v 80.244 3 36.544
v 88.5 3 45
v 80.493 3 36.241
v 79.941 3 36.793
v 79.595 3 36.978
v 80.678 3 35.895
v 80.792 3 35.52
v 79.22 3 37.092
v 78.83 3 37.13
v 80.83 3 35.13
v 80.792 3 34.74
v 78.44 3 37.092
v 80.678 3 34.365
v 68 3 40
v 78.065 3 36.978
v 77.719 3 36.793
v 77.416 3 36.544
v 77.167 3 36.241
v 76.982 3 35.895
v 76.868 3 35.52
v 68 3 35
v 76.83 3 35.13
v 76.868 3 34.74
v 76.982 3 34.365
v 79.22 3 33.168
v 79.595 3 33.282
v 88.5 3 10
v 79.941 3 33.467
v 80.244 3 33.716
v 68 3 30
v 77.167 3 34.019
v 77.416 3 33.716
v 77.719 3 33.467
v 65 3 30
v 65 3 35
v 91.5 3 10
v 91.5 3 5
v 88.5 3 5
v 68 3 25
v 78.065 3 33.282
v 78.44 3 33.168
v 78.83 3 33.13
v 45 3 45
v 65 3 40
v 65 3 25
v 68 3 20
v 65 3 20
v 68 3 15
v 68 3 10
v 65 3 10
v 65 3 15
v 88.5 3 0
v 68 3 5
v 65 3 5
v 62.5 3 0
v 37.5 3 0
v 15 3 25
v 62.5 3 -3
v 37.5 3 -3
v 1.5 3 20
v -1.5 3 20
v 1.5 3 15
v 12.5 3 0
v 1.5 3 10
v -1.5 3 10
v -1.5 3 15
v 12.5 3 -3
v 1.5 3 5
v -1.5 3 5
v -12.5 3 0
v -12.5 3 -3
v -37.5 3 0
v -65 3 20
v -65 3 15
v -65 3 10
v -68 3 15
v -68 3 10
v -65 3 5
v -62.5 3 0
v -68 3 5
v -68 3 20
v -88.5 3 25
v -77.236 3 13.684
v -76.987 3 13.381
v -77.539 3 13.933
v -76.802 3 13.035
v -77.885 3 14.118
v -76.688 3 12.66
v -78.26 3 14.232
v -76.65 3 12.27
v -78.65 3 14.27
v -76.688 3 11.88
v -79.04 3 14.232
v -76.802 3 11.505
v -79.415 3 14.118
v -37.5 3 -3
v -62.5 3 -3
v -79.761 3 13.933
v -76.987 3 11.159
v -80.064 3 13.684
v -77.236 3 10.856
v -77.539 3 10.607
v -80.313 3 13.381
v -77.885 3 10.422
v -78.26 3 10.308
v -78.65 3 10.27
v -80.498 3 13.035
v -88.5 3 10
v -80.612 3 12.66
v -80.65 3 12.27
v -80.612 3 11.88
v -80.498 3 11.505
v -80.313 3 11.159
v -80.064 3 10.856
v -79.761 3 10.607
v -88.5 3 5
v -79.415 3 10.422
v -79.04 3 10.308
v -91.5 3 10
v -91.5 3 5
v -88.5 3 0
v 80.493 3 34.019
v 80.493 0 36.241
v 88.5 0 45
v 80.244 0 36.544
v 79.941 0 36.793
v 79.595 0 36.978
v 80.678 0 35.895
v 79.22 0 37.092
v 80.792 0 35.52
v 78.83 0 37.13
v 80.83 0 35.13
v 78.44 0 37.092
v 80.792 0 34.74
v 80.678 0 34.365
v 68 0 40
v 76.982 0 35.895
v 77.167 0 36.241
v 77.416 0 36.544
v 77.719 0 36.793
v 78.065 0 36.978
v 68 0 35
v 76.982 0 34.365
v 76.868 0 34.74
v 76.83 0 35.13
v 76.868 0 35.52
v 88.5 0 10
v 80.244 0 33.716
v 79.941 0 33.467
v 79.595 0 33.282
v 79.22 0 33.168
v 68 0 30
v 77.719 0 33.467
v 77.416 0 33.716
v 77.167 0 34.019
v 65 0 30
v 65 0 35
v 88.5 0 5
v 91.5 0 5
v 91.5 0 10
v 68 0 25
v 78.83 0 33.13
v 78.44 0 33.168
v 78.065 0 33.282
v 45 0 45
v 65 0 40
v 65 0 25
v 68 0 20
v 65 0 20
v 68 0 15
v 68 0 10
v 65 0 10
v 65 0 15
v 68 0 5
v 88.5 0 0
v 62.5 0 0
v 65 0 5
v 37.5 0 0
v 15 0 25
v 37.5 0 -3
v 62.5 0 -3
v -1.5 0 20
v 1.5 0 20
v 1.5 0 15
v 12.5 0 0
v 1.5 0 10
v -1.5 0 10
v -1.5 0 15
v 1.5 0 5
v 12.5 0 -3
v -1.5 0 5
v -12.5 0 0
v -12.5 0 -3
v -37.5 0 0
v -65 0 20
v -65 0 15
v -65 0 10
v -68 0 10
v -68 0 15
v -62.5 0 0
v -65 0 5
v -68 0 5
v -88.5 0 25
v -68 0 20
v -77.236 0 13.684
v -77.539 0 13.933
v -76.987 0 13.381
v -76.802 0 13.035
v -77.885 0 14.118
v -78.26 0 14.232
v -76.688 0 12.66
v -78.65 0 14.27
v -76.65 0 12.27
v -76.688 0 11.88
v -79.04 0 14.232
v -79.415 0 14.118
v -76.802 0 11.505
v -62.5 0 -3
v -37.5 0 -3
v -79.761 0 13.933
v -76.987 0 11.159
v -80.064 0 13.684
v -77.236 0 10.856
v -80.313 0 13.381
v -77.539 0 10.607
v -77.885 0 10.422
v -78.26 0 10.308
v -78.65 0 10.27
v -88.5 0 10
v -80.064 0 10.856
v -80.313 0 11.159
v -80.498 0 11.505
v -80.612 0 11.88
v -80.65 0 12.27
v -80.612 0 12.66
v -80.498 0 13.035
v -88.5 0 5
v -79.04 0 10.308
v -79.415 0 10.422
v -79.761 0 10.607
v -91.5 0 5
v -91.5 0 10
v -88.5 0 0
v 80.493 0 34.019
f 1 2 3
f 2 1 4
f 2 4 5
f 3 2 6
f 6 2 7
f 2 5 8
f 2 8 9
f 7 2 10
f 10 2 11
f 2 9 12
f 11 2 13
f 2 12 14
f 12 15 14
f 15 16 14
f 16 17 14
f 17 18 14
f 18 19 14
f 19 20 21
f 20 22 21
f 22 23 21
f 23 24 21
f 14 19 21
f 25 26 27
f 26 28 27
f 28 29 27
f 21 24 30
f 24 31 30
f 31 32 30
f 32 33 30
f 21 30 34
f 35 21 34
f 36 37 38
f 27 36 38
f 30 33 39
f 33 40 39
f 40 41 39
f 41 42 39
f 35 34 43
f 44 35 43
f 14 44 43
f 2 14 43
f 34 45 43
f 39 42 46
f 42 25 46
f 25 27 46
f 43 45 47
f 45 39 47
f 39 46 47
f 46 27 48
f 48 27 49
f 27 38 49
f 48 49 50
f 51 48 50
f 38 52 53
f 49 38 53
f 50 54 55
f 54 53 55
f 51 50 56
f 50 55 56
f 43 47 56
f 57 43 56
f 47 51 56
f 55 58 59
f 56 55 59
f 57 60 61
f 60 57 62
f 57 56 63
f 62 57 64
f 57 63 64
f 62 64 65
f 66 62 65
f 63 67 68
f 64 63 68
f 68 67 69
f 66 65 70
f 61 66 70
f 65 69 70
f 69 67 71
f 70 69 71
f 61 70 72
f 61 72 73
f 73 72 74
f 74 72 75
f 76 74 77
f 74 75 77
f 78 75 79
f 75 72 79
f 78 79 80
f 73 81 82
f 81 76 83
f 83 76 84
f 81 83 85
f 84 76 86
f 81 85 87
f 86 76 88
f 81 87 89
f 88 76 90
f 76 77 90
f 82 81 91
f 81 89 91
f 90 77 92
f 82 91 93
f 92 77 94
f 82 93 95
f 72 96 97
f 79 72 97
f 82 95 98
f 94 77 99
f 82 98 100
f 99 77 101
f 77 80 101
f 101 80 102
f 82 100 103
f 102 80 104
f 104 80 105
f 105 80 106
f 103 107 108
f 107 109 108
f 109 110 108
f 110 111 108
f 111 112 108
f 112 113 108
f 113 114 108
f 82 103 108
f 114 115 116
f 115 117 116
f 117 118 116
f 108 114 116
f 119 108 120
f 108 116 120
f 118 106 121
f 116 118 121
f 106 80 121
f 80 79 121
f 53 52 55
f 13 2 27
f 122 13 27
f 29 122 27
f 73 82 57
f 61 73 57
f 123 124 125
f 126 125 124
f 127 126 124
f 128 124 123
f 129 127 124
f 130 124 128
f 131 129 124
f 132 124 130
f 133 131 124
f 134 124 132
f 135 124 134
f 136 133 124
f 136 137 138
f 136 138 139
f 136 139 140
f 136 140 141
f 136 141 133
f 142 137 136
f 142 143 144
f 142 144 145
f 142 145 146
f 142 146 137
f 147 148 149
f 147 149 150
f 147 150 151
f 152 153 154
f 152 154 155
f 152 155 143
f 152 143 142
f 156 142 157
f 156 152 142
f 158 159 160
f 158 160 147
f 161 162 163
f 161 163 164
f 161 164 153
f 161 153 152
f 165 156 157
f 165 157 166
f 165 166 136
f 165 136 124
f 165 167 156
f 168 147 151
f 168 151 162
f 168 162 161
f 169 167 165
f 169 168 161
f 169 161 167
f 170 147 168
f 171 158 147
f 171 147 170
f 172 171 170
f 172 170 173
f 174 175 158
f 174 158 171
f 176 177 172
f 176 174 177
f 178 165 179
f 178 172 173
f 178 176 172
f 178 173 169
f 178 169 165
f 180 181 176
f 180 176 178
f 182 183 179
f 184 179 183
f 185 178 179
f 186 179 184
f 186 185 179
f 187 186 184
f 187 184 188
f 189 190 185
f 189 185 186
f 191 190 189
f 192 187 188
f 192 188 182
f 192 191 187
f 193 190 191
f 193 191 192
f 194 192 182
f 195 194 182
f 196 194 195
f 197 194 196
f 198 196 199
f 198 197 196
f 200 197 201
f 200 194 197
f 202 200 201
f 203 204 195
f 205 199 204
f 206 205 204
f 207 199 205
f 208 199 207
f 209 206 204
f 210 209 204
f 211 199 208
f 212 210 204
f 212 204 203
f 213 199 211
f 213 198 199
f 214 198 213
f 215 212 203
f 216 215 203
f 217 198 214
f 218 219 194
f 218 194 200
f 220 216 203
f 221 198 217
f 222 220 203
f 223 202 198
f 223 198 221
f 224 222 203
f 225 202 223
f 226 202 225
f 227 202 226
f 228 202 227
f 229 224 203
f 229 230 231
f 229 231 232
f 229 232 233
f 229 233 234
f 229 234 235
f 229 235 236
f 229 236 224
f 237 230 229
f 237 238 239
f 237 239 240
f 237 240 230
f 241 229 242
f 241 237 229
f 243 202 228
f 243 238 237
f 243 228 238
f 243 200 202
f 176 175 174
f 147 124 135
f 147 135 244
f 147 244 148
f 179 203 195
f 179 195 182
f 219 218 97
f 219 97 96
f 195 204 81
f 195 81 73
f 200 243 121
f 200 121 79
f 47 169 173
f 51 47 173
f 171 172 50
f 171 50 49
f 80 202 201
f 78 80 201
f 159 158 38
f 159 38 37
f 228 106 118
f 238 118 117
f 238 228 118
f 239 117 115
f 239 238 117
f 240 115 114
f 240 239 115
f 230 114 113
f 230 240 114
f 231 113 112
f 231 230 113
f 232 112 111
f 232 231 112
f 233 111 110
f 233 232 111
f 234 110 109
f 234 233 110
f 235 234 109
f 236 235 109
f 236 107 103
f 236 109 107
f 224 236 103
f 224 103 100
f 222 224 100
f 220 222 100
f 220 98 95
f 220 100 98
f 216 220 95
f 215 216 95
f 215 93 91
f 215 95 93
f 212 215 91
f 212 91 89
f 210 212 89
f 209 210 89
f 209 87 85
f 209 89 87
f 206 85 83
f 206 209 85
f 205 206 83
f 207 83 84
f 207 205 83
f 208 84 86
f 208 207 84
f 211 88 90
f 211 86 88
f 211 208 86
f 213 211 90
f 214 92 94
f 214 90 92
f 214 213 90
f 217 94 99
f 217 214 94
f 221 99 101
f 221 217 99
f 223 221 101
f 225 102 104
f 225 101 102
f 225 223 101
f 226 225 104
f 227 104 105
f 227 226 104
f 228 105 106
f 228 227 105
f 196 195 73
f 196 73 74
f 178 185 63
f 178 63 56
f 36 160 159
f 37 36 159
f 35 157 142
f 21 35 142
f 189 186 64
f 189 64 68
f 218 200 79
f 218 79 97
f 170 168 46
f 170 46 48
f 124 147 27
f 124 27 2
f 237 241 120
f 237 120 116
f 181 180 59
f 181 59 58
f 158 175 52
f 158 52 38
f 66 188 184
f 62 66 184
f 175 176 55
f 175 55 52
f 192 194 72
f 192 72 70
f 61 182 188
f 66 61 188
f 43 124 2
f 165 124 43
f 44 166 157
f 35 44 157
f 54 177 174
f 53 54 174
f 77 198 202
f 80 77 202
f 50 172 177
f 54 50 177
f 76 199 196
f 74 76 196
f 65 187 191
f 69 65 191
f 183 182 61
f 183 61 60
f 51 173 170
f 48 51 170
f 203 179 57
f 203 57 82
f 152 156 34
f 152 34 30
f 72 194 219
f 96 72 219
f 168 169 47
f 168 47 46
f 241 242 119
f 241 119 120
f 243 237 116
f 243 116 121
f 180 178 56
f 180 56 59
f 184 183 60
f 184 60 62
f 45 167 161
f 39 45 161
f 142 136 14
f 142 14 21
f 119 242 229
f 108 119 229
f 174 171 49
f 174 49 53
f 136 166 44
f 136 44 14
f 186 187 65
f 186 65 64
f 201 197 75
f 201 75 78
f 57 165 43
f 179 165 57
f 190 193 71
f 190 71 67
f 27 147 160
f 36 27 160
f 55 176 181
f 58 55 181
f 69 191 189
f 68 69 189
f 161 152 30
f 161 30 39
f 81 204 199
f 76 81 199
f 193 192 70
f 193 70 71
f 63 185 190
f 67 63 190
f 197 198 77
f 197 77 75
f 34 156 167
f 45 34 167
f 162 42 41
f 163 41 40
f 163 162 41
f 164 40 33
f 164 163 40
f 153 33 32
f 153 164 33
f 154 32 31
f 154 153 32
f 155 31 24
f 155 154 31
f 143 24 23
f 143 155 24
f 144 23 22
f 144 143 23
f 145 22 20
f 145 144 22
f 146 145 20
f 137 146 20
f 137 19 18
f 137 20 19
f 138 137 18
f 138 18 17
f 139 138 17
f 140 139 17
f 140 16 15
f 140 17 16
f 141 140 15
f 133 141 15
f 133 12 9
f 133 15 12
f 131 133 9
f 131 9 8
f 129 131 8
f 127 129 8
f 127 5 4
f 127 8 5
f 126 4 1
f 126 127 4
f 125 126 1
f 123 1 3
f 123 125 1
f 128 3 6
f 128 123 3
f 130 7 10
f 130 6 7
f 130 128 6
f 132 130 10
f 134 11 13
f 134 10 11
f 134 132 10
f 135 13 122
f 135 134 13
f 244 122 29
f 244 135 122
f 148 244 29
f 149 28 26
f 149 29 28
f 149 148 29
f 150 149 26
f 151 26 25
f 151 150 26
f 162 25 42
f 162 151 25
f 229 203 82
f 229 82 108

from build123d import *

# Parameters (mm, degrees)
P_IDAT_VYSUNUT_M1_DEPTH  = 3
SKICA2_W                 = 3
SKICA2_H                 = 5
ODEBRAT_VYSUNUT_M1_DEPTH = 100.328998787
SKICA3_W                 = 25
SKICA3_H                 = 3
SKICA3_W_2               = 3
SKICA3_H_2               = 5
P_IDAT_VYSUNUT_M2_DEPTH  = 3
SKICA4_R                 = 2
ODEBRAT_VYSUNUT_M3_DEPTH = 103.011028816


with BuildPart() as part:
    # Skica1 → Přidat vysunutím1 (new body)
    with BuildSketch(Plane(origin=(0, 0, 0), x_dir=(1, 0, 0), z_dir=(0, 1, 0))):
        Polygon((-88.5, 0), (88.5, 0), (88.5, -45), (45, -45), (15, -25), (-88.5, -25), align=None)
    extrude(amount=P_IDAT_VYSUNUT_M1_DEPTH)

    # Skica2 → Odebrat vysunutím1 (cut, through all)
    with BuildSketch(Plane(origin=(0, 0, 0), x_dir=(1, 0, 0), z_dir=(0, 1, 0))):
        with Locations((0, -7.5)):
            Rectangle(SKICA2_W, SKICA2_H)
        with Locations((0, -17.5)):
            Rectangle(SKICA2_W, SKICA2_H)
        with Locations((-66.5, -7.5)):
            Rectangle(SKICA2_W, SKICA2_H)
        with Locations((-66.5, -17.5)):
            Rectangle(SKICA2_W, SKICA2_H)
        with Locations((66.5, -7.5)):
            Rectangle(SKICA2_W, SKICA2_H)
        with Locations((66.5, -17.5)):
            Rectangle(SKICA2_W, SKICA2_H)
        with Locations((66.5, -27.5)):
            Rectangle(SKICA2_W, SKICA2_H)
        with Locations((66.5, -37.5)):
            Rectangle(SKICA2_W, SKICA2_H)
    extrude(amount=ODEBRAT_VYSUNUT_M1_DEPTH, mode=Mode.SUBTRACT)

    # Skica3 → Přidat vysunutím2 (add)
    with BuildSketch(Plane(origin=(0, 0, 0), x_dir=(1, 0, 0), z_dir=(0, 1, 0))):
        with Locations((-50, 1.5)):
            Rectangle(SKICA3_W, SKICA3_H)
        with Locations((0, 1.5)):
            Rectangle(SKICA3_W, SKICA3_H)
        with Locations((50, 1.5)):
            Rectangle(SKICA3_W, SKICA3_H)
        with Locations((90, -7.5)):
            Rectangle(SKICA3_W_2, SKICA3_H_2)
        with Locations((-90, -7.5)):
            Rectangle(SKICA3_W_2, SKICA3_H_2)
    extrude(amount=P_IDAT_VYSUNUT_M2_DEPTH)

    # Skica4 → Odebrat vysunutím3 (cut, through all)
    with BuildSketch(Plane(origin=(0, 0, 0), x_dir=(1, 0, 0), z_dir=(0, 1, 0))):
        with Locations(Location((-78.65, -12.27, 0), (0, 0, 90))):
            Circle(SKICA4_R)
        with Locations(Location((78.83, -35.13, 0), (0, 0, 90))):
            Circle(SKICA4_R)
    extrude(amount=ODEBRAT_VYSUNUT_M3_DEPTH, mode=Mode.SUBTRACT)


solid = part.part
